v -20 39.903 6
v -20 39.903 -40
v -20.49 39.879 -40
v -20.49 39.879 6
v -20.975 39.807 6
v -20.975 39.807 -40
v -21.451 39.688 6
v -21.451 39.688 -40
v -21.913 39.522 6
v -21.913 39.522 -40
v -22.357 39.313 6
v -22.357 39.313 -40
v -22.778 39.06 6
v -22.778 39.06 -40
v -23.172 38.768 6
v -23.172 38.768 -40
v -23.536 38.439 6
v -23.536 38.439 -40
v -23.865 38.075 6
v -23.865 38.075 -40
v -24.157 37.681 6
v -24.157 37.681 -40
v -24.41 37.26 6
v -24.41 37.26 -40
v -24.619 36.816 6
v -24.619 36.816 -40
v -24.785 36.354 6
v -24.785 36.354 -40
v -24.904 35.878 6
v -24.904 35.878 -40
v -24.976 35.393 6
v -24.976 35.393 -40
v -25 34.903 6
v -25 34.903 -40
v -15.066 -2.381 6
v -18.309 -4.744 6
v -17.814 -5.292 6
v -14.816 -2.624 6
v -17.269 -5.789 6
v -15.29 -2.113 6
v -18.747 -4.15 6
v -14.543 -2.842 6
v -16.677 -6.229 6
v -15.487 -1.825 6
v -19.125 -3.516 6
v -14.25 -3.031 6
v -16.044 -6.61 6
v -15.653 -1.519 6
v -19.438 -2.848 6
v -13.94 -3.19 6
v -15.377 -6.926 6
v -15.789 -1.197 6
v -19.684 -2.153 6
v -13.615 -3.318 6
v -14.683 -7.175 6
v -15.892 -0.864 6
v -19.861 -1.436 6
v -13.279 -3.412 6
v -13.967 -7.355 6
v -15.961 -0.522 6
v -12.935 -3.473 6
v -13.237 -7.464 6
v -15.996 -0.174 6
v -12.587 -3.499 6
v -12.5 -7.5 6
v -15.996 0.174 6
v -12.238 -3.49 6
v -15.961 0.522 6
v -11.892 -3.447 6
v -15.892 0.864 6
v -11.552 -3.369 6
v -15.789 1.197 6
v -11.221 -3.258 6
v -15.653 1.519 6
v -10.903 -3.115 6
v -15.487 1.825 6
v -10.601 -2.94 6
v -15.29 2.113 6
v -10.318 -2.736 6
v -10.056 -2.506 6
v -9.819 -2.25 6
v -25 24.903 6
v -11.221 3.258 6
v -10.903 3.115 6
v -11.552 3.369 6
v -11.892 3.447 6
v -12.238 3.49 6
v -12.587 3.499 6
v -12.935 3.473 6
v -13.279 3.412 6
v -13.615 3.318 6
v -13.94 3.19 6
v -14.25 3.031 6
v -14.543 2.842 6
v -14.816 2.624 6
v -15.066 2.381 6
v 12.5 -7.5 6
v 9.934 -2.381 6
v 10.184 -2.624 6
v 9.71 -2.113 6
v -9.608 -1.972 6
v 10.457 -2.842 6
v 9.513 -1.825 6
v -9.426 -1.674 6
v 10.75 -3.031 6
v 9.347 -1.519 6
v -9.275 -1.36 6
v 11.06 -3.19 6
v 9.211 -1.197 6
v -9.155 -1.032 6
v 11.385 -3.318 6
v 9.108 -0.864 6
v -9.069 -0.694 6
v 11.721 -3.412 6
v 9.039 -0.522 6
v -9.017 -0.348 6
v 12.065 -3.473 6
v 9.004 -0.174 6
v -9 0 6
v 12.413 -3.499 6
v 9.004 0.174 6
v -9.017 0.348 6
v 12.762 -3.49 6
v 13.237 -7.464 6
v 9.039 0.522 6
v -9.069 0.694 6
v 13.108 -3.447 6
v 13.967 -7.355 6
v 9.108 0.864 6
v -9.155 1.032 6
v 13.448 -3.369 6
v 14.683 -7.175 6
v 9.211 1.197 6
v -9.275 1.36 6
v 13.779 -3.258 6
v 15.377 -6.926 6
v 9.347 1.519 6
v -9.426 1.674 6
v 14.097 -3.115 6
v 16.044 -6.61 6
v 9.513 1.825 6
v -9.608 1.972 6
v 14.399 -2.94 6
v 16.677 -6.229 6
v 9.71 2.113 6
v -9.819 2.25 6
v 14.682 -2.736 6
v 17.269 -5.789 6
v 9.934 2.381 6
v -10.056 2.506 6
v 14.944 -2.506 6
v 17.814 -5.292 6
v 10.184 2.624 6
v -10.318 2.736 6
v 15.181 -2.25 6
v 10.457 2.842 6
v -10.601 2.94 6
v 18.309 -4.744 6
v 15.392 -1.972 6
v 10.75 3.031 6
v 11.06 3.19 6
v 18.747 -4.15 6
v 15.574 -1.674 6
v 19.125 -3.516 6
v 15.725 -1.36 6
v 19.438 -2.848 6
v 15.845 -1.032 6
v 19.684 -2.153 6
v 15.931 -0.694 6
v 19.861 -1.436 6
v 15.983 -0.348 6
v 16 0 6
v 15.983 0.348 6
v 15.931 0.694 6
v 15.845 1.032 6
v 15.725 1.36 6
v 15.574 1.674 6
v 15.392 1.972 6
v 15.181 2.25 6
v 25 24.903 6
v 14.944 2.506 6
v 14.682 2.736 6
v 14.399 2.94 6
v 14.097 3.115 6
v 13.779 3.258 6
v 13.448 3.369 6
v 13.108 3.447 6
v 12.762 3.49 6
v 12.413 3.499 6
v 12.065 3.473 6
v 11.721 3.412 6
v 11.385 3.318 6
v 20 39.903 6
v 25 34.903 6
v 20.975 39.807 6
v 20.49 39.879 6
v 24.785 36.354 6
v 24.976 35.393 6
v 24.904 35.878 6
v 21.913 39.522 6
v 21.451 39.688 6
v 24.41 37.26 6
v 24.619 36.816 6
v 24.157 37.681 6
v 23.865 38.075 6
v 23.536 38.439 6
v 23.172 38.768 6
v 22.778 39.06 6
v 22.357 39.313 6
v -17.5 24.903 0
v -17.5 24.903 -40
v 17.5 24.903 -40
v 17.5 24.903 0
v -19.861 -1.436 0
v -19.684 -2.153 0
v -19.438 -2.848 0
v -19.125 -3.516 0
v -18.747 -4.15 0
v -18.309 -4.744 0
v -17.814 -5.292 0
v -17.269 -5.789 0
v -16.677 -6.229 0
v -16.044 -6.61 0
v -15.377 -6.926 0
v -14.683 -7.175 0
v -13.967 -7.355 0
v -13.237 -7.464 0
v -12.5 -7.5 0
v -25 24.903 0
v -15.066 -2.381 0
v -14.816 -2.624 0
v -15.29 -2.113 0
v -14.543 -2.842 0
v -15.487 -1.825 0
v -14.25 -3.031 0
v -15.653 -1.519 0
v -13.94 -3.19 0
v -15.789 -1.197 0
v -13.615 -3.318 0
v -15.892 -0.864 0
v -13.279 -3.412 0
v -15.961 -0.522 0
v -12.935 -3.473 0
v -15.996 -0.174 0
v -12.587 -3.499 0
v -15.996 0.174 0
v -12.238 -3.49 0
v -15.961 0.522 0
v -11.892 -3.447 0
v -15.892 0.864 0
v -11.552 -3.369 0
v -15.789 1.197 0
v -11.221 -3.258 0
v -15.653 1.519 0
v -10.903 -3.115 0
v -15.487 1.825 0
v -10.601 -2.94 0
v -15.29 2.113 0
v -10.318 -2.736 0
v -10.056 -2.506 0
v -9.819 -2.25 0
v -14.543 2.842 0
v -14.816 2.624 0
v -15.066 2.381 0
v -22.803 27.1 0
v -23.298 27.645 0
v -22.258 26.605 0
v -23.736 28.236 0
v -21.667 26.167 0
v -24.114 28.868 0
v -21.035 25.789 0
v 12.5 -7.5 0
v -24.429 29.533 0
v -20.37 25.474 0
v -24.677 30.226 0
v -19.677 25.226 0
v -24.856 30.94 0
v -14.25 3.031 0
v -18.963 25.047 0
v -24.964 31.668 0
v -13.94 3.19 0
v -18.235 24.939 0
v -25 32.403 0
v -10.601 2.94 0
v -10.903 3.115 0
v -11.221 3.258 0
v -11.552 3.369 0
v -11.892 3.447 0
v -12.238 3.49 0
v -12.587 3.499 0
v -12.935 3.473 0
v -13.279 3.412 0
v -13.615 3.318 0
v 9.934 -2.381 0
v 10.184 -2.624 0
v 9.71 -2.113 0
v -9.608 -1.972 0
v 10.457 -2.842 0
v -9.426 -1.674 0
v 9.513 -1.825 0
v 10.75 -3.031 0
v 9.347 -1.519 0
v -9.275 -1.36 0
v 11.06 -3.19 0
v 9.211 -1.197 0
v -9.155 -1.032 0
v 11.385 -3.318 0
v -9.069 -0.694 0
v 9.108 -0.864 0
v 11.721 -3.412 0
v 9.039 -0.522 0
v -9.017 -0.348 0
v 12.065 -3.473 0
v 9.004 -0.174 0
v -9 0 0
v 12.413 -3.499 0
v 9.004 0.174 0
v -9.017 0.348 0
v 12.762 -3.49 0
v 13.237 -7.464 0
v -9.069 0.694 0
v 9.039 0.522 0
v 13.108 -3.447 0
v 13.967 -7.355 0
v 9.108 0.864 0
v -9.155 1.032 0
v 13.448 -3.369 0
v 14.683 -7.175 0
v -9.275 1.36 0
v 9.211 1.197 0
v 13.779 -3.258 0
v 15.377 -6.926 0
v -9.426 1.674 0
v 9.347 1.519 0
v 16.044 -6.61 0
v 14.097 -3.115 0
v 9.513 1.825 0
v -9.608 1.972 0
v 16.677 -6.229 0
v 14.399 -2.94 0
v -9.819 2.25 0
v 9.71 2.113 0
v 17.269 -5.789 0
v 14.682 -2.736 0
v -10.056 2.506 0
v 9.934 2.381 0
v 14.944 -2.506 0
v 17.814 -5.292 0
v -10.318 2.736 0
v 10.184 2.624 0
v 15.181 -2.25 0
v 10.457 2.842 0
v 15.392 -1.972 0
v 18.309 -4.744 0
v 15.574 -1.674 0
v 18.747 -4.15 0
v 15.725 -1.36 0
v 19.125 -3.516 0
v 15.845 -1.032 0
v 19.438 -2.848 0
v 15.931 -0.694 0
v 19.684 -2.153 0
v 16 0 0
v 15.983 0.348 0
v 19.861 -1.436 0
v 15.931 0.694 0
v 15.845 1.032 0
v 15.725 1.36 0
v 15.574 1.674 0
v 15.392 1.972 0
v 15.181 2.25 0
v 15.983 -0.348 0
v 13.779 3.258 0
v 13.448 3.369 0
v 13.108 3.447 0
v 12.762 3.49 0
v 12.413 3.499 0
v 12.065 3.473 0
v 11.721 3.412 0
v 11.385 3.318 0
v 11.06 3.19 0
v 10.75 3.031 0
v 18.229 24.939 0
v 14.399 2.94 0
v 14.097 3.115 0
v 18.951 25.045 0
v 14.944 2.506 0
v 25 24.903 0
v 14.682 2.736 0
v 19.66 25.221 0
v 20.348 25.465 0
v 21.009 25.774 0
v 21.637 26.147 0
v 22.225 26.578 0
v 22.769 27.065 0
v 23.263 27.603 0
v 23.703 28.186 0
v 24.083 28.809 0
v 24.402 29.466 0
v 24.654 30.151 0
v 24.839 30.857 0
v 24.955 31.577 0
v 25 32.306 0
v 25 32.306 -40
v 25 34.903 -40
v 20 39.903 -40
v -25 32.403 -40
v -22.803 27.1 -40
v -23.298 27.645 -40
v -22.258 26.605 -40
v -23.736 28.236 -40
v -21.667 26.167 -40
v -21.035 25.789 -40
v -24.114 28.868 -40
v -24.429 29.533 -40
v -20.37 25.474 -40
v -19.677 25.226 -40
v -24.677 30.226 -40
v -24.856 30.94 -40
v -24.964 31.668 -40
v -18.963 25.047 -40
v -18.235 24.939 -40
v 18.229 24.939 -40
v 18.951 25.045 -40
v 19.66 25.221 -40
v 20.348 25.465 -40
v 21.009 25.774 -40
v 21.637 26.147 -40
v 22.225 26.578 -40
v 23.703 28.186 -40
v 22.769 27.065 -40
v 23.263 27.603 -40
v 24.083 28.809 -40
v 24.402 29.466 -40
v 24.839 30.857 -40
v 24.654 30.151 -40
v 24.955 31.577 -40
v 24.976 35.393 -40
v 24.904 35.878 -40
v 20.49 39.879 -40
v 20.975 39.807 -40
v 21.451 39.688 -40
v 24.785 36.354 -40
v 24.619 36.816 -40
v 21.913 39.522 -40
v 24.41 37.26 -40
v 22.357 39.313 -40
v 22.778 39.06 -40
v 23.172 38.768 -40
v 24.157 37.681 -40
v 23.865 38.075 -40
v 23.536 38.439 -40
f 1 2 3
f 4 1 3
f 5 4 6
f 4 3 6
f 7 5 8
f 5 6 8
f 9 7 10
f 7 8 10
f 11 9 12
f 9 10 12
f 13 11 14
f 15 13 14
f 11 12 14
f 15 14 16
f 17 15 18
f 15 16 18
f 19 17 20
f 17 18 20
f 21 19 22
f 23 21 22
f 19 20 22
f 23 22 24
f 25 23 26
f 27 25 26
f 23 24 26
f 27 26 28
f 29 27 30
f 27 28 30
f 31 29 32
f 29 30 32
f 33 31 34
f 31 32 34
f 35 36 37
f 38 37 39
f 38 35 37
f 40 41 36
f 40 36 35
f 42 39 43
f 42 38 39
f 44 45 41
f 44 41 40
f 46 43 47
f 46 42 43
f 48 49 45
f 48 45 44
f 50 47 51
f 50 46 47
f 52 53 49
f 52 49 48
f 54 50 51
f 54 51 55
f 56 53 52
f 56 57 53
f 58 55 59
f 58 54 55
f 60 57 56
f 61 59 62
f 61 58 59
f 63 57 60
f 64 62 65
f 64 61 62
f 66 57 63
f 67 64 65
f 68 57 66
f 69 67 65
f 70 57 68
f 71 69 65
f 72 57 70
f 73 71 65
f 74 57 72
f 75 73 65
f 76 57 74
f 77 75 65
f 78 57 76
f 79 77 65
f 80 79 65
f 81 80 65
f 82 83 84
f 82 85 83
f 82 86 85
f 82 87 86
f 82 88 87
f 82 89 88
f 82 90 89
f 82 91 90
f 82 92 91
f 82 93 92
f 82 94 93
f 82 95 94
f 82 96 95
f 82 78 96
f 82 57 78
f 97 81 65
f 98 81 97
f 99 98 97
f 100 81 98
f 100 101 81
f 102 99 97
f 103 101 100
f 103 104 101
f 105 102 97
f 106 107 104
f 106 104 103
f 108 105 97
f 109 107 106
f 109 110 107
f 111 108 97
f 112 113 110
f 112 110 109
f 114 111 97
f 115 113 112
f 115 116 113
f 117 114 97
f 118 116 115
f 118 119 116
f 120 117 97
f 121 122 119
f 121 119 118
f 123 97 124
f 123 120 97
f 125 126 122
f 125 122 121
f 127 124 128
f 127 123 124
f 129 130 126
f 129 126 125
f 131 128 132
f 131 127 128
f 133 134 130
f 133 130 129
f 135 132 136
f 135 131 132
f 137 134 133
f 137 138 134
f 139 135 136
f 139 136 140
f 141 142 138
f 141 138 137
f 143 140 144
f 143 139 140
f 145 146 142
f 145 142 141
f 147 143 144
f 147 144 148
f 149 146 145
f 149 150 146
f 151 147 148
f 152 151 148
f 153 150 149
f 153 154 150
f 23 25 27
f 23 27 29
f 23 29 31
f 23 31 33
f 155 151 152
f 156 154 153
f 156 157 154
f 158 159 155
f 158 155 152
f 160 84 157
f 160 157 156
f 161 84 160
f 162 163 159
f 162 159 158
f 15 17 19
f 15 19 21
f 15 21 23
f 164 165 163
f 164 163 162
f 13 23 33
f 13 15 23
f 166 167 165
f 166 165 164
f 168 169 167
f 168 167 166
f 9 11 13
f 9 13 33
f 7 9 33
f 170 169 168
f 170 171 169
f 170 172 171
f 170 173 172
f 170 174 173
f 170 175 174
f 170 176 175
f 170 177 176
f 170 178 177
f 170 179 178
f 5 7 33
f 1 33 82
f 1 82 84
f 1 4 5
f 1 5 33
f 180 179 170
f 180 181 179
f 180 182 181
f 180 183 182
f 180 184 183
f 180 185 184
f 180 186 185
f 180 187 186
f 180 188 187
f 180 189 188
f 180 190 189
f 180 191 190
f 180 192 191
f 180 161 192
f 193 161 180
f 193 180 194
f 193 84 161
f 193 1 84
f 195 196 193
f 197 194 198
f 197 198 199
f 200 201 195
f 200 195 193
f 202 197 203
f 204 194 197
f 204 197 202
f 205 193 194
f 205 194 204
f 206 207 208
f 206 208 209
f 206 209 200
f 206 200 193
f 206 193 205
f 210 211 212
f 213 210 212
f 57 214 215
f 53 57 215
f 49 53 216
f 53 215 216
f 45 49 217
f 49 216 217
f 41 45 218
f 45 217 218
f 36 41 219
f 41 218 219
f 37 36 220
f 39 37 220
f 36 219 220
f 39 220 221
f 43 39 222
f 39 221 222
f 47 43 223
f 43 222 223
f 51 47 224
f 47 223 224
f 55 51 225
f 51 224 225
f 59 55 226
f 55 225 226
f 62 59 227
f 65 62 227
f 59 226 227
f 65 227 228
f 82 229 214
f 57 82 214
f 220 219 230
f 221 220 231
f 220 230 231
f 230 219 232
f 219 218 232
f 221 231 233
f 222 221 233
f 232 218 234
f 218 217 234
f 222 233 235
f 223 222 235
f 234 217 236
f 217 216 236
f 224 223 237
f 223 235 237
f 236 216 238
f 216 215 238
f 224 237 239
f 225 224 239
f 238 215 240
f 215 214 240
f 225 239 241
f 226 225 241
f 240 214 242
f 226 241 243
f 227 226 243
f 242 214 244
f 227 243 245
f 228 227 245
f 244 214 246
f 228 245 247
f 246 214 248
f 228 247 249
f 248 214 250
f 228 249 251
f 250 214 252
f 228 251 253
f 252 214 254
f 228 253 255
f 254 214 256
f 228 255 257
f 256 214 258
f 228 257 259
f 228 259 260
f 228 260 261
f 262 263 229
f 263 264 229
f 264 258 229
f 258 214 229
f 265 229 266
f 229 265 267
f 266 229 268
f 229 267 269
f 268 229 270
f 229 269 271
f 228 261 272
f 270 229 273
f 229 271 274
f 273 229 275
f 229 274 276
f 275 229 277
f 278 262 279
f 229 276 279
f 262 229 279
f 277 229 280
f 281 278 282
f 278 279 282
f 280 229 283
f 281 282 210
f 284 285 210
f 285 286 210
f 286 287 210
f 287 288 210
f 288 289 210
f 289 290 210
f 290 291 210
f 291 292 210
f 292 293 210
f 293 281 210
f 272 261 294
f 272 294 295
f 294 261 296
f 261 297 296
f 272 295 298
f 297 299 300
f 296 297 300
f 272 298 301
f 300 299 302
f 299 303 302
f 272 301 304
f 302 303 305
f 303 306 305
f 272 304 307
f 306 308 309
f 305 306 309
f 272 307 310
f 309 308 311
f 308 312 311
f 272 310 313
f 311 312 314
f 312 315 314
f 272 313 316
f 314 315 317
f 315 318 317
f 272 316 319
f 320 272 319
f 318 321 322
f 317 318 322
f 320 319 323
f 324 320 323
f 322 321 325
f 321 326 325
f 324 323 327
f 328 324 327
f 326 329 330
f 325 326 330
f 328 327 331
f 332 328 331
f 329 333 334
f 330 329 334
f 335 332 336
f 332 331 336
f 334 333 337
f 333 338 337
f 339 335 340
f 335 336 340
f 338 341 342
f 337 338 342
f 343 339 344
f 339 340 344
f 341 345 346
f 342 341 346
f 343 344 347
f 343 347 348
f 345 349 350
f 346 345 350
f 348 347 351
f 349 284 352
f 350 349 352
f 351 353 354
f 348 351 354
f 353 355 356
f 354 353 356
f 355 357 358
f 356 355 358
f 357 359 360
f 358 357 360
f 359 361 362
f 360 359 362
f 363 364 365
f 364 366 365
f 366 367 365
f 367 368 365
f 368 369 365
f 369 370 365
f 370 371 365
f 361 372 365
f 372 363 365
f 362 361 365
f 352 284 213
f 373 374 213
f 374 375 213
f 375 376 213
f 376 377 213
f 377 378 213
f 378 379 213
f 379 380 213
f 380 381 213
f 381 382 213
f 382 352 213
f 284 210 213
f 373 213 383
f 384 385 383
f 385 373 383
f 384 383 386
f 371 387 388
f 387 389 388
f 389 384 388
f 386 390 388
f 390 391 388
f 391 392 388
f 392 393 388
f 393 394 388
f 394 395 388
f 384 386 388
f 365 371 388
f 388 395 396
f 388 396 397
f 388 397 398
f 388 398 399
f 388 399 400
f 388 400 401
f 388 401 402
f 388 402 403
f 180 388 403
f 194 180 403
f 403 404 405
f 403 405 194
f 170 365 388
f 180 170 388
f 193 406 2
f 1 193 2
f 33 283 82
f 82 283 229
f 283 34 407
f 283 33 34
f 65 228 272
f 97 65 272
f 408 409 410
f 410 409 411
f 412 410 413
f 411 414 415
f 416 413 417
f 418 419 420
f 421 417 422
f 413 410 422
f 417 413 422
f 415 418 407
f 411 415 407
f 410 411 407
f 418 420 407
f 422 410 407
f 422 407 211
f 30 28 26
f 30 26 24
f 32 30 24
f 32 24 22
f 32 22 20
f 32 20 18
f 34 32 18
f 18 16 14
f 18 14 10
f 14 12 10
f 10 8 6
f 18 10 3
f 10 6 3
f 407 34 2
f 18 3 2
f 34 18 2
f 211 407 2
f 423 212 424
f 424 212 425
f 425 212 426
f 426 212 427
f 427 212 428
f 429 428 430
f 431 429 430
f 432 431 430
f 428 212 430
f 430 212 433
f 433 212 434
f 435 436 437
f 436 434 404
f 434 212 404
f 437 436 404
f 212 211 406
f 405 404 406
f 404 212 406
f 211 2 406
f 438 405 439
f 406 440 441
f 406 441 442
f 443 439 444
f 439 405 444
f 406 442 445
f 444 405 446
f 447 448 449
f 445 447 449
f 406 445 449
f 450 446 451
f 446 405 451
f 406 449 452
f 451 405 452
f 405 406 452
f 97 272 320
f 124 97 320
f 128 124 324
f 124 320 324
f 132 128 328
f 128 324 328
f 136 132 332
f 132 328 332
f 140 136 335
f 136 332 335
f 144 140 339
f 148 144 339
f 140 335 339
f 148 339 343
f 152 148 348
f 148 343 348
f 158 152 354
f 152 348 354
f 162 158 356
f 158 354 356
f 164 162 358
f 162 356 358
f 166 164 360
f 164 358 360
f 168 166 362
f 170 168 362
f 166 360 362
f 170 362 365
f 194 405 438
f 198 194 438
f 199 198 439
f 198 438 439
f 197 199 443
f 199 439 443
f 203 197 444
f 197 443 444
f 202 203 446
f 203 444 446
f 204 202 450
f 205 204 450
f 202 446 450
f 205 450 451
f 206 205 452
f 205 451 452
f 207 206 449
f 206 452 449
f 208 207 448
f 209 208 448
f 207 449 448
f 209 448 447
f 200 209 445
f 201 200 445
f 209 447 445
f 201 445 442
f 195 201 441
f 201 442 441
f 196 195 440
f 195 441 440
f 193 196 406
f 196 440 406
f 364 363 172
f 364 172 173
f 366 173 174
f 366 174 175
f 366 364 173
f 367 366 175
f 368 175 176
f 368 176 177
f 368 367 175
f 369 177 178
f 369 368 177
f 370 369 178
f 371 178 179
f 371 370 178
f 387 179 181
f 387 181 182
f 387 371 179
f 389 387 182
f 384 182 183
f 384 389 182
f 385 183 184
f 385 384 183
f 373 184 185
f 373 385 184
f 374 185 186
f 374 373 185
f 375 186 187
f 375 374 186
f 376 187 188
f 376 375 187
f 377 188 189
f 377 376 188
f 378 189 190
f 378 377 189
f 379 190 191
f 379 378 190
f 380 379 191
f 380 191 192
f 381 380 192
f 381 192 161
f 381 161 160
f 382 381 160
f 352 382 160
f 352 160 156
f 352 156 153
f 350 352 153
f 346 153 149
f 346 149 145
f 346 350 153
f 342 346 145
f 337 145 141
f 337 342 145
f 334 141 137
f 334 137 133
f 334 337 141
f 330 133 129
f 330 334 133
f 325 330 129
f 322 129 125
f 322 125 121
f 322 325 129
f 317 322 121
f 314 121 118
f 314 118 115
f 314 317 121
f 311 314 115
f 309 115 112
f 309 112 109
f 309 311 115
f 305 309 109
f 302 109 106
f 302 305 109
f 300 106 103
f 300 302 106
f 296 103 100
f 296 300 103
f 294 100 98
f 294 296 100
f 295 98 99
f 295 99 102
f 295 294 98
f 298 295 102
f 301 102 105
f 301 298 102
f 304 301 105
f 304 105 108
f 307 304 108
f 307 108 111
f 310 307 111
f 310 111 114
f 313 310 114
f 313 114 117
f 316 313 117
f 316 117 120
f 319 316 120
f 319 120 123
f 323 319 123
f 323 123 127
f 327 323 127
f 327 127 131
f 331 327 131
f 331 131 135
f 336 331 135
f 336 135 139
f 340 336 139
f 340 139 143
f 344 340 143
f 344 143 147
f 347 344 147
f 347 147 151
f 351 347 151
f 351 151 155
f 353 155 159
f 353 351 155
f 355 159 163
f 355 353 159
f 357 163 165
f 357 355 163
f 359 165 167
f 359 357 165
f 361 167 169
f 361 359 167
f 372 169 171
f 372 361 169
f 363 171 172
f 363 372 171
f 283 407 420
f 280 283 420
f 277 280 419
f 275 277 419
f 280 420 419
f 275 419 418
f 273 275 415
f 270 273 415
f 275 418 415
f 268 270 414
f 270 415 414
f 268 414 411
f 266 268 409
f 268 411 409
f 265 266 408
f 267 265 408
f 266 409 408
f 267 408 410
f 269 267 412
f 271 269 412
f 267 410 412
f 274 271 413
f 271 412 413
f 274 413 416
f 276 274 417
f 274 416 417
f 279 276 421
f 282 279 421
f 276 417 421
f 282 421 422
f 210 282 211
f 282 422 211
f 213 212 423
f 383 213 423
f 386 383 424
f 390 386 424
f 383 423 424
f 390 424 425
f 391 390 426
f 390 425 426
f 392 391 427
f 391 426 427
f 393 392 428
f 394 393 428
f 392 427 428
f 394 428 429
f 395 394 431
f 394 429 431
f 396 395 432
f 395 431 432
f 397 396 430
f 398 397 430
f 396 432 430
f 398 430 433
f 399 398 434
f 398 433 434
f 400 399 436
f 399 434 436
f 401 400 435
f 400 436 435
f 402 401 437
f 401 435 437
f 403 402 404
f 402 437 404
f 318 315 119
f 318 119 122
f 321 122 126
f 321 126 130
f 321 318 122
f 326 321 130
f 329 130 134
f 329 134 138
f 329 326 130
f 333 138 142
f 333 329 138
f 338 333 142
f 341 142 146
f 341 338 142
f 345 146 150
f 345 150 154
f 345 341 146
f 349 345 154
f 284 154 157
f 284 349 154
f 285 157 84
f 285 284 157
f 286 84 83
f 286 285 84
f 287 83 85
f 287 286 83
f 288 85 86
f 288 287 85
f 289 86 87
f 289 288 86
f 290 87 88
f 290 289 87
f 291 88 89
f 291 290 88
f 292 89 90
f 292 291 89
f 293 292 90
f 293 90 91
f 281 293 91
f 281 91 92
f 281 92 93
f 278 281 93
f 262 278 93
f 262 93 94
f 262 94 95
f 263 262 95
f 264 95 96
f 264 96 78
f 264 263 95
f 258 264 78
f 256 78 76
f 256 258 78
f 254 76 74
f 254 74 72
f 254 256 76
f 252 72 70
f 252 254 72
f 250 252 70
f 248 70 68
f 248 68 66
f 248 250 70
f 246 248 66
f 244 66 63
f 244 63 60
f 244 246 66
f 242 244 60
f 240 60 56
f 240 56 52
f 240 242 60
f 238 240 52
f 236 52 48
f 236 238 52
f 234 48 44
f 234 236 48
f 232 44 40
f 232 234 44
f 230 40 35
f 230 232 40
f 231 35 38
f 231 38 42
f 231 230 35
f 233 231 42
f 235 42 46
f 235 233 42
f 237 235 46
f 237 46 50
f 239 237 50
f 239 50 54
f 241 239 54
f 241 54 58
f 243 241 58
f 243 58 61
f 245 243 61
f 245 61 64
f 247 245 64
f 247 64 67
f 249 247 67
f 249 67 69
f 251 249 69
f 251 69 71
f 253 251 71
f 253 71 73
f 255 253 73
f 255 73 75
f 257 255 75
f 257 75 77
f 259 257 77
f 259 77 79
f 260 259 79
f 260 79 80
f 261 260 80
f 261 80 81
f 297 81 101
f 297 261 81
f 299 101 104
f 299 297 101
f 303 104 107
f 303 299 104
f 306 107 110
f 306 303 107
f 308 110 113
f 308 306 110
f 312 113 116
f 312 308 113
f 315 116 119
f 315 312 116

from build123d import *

# Parameters (mm, degrees)
SKETCH_1_R      = 3.5
EXTRUDE_1_DEPTH = 6
EXTRUDE_START   = -40
EXTRUDE_2_DEPTH = 40


with BuildPart() as part:
    # 草图1 → 凸台-拉伸1 (new body)
    with BuildSketch(Plane.XY):
        with BuildLine():
            ThreePointArc((-19.861209285, -1.436174734), (-17.268578902, -5.788838852), (-12.5, -7.5))
            Line((-12.5, -7.5), (12.5, -7.5))
            ThreePointArc((12.5, -7.5), (17.268578902, -5.788838852), (19.861209285, -1.436174734))
            Line((19.861209285, -1.436174734), (25, 24.903039453))
            Line((25, 24.903039453), (25, 34.903039453))
            ThreePointArc((25, 34.903039453), (23.535533906, 38.438573359), (20, 39.903039453))
            Line((20, 39.903039453), (-20, 39.903039453))
            ThreePointArc((-20, 39.903039453), (-23.535533906, 38.438573359), (-25, 34.903039453))
            Line((-25, 34.903039453), (-25, 24.903039453))
            Line((-25, 24.903039453), (-19.861209285, -1.436174734))
        make_face()
        with Locations((-12.5, 0)):
            Circle(SKETCH_1_R, mode=Mode.SUBTRACT)
        with Locations((12.5, 0)):
            Circle(SKETCH_1_R, mode=Mode.SUBTRACT)
    extrude(amount=EXTRUDE_1_DEPTH)

    # 草图1<6> → 凸台-拉伸2 (add)
    with BuildSketch(Plane.XY.offset(EXTRUDE_START)):
        with BuildLine():
            Line((-25, 34.903039453), (-25, 32.403039453))
            ThreePointArc((-25, 32.403039453), (-22.803300859, 27.099738594), (-17.5, 24.903039453))
            Line((-17.5, 24.903039453), (17.5, 24.903039453))
            ThreePointArc((17.5, 24.903039453), (22.769312351, 27.065347755), (25, 32.306078854))
            Line((25, 32.306078854), (25, 32.5))
            Line((25, 32.5), (25, 34.903039453))
            ThreePointArc((25, 34.903039453), (23.535533906, 38.438573359), (20, 39.903039453))
            Line((20, 39.903039453), (-20, 39.903039453))
            ThreePointArc((-20, 39.903039453), (-23.535533906, 38.438573359), (-25, 34.903039453))
        make_face()
    extrude(amount=EXTRUDE_2_DEPTH)


solid = part.part
